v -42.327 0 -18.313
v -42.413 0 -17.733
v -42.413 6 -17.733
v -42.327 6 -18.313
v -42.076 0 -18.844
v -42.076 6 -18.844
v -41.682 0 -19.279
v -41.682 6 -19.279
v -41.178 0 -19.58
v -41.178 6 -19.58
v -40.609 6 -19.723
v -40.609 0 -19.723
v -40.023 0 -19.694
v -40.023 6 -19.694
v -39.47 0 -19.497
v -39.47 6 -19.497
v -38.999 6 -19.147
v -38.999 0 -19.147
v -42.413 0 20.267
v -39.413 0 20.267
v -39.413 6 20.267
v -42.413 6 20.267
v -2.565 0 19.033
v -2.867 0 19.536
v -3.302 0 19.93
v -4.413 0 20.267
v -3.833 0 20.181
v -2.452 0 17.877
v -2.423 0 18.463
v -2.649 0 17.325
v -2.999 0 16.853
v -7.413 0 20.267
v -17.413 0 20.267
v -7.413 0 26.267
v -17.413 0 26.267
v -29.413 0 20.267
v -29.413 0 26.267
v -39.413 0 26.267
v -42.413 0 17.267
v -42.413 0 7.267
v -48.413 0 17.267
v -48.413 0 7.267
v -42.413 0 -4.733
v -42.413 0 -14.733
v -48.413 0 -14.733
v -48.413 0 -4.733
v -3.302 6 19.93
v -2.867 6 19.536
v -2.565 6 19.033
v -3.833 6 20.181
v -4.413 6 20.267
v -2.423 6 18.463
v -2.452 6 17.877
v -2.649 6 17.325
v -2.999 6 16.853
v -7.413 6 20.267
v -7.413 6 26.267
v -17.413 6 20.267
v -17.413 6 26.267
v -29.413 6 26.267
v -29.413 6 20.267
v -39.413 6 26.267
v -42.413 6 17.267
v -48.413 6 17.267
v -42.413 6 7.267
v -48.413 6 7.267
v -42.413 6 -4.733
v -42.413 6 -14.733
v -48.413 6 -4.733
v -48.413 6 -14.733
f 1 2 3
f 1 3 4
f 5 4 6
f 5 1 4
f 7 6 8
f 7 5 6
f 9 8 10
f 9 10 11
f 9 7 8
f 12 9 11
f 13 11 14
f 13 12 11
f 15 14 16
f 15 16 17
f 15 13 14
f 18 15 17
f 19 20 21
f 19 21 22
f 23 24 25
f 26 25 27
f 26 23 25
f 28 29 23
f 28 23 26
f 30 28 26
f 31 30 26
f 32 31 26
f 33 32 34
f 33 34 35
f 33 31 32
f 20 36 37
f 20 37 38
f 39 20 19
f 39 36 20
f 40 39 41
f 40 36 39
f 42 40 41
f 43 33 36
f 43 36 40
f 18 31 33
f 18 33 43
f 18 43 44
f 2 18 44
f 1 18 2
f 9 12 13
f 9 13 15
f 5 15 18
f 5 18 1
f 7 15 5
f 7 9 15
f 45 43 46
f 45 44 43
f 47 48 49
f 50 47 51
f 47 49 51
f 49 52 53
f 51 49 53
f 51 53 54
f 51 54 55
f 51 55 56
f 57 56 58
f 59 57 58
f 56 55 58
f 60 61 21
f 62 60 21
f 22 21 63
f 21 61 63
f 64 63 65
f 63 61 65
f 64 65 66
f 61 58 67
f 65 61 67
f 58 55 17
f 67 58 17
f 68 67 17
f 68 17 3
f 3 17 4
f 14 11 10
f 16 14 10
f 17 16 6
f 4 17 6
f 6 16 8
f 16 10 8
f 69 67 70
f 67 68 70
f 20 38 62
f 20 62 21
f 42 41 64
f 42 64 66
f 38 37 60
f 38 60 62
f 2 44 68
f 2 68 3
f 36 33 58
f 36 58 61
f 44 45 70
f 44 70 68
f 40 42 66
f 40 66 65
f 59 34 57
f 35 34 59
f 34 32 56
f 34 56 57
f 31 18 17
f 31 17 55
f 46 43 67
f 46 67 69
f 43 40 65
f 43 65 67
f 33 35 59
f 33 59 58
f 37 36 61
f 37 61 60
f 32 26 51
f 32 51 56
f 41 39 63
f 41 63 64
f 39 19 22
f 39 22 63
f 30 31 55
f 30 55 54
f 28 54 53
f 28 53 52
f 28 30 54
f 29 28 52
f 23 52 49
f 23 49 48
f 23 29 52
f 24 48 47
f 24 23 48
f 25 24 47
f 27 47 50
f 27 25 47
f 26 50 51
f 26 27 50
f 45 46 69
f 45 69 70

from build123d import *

# Parameters (mm, degrees)
BOSS_EXTRUDE1_DEPTH = 6


with BuildPart() as part:
    # Sketch2 → Boss-Extrude1 (new body)
    with BuildSketch(Plane(origin=(0, 0, 0), x_dir=(1, 0, 0), z_dir=(0, 1, 0))):
        with BuildLine():
            Line((-38.998907426, 19.146898027), (-2.998907426, -16.853101973))
            ThreePointArc((-2.998907426, -16.853101973), (-2.565361924, -19.0326824), (-4.413120989, -20.267315535))
            Line((-4.413120989, -20.267315535), (-7.413120989, -20.267315535))
            Line((-7.413120989, -20.267315535), (-7.413120989, -26.267315535))
            Line((-7.413120989, -26.267315535), (-17.413120989, -26.267315535))
            Line((-17.413120989, -26.267315535), (-17.413120989, -20.267315535))
            Line((-17.413120989, -20.267315535), (-29.413120989, -20.267315535))
            Line((-29.413120989, -20.267315535), (-29.413120989, -26.267315535))
            Line((-29.413120989, -26.267315535), (-39.413120989, -26.267315535))
            Line((-39.413120989, -26.267315535), (-39.413120989, -20.267315535))
            Line((-39.413120989, -20.267315535), (-42.413120989, -20.267315535))
            Line((-42.413120989, -20.267315535), (-42.413120989, -17.267315535))
            Line((-42.413120989, -17.267315535), (-48.413120989, -17.267315535))
            Line((-48.413120989, -17.267315535), (-48.413120989, -7.267315535))
            Line((-48.413120989, -7.267315535), (-42.413120989, -7.267315535))
            Line((-42.413120989, -7.267315535), (-42.413120989, 4.732684465))
            Line((-42.413120989, 4.732684465), (-48.413120989, 4.732684465))
            Line((-48.413120989, 4.732684465), (-48.413120989, 14.732684465))
            Line((-48.413120989, 14.732684465), (-42.413120989, 14.732684465))
            Line((-42.413120989, 14.732684465), (-42.413120989, 17.732684465))
            ThreePointArc((-42.413120989, 17.732684465), (-41.178487854, 19.58044353), (-38.998907426, 19.146898027))
        make_face()
    extrude(amount=BOSS_EXTRUDE1_DEPTH)


solid = part.part
